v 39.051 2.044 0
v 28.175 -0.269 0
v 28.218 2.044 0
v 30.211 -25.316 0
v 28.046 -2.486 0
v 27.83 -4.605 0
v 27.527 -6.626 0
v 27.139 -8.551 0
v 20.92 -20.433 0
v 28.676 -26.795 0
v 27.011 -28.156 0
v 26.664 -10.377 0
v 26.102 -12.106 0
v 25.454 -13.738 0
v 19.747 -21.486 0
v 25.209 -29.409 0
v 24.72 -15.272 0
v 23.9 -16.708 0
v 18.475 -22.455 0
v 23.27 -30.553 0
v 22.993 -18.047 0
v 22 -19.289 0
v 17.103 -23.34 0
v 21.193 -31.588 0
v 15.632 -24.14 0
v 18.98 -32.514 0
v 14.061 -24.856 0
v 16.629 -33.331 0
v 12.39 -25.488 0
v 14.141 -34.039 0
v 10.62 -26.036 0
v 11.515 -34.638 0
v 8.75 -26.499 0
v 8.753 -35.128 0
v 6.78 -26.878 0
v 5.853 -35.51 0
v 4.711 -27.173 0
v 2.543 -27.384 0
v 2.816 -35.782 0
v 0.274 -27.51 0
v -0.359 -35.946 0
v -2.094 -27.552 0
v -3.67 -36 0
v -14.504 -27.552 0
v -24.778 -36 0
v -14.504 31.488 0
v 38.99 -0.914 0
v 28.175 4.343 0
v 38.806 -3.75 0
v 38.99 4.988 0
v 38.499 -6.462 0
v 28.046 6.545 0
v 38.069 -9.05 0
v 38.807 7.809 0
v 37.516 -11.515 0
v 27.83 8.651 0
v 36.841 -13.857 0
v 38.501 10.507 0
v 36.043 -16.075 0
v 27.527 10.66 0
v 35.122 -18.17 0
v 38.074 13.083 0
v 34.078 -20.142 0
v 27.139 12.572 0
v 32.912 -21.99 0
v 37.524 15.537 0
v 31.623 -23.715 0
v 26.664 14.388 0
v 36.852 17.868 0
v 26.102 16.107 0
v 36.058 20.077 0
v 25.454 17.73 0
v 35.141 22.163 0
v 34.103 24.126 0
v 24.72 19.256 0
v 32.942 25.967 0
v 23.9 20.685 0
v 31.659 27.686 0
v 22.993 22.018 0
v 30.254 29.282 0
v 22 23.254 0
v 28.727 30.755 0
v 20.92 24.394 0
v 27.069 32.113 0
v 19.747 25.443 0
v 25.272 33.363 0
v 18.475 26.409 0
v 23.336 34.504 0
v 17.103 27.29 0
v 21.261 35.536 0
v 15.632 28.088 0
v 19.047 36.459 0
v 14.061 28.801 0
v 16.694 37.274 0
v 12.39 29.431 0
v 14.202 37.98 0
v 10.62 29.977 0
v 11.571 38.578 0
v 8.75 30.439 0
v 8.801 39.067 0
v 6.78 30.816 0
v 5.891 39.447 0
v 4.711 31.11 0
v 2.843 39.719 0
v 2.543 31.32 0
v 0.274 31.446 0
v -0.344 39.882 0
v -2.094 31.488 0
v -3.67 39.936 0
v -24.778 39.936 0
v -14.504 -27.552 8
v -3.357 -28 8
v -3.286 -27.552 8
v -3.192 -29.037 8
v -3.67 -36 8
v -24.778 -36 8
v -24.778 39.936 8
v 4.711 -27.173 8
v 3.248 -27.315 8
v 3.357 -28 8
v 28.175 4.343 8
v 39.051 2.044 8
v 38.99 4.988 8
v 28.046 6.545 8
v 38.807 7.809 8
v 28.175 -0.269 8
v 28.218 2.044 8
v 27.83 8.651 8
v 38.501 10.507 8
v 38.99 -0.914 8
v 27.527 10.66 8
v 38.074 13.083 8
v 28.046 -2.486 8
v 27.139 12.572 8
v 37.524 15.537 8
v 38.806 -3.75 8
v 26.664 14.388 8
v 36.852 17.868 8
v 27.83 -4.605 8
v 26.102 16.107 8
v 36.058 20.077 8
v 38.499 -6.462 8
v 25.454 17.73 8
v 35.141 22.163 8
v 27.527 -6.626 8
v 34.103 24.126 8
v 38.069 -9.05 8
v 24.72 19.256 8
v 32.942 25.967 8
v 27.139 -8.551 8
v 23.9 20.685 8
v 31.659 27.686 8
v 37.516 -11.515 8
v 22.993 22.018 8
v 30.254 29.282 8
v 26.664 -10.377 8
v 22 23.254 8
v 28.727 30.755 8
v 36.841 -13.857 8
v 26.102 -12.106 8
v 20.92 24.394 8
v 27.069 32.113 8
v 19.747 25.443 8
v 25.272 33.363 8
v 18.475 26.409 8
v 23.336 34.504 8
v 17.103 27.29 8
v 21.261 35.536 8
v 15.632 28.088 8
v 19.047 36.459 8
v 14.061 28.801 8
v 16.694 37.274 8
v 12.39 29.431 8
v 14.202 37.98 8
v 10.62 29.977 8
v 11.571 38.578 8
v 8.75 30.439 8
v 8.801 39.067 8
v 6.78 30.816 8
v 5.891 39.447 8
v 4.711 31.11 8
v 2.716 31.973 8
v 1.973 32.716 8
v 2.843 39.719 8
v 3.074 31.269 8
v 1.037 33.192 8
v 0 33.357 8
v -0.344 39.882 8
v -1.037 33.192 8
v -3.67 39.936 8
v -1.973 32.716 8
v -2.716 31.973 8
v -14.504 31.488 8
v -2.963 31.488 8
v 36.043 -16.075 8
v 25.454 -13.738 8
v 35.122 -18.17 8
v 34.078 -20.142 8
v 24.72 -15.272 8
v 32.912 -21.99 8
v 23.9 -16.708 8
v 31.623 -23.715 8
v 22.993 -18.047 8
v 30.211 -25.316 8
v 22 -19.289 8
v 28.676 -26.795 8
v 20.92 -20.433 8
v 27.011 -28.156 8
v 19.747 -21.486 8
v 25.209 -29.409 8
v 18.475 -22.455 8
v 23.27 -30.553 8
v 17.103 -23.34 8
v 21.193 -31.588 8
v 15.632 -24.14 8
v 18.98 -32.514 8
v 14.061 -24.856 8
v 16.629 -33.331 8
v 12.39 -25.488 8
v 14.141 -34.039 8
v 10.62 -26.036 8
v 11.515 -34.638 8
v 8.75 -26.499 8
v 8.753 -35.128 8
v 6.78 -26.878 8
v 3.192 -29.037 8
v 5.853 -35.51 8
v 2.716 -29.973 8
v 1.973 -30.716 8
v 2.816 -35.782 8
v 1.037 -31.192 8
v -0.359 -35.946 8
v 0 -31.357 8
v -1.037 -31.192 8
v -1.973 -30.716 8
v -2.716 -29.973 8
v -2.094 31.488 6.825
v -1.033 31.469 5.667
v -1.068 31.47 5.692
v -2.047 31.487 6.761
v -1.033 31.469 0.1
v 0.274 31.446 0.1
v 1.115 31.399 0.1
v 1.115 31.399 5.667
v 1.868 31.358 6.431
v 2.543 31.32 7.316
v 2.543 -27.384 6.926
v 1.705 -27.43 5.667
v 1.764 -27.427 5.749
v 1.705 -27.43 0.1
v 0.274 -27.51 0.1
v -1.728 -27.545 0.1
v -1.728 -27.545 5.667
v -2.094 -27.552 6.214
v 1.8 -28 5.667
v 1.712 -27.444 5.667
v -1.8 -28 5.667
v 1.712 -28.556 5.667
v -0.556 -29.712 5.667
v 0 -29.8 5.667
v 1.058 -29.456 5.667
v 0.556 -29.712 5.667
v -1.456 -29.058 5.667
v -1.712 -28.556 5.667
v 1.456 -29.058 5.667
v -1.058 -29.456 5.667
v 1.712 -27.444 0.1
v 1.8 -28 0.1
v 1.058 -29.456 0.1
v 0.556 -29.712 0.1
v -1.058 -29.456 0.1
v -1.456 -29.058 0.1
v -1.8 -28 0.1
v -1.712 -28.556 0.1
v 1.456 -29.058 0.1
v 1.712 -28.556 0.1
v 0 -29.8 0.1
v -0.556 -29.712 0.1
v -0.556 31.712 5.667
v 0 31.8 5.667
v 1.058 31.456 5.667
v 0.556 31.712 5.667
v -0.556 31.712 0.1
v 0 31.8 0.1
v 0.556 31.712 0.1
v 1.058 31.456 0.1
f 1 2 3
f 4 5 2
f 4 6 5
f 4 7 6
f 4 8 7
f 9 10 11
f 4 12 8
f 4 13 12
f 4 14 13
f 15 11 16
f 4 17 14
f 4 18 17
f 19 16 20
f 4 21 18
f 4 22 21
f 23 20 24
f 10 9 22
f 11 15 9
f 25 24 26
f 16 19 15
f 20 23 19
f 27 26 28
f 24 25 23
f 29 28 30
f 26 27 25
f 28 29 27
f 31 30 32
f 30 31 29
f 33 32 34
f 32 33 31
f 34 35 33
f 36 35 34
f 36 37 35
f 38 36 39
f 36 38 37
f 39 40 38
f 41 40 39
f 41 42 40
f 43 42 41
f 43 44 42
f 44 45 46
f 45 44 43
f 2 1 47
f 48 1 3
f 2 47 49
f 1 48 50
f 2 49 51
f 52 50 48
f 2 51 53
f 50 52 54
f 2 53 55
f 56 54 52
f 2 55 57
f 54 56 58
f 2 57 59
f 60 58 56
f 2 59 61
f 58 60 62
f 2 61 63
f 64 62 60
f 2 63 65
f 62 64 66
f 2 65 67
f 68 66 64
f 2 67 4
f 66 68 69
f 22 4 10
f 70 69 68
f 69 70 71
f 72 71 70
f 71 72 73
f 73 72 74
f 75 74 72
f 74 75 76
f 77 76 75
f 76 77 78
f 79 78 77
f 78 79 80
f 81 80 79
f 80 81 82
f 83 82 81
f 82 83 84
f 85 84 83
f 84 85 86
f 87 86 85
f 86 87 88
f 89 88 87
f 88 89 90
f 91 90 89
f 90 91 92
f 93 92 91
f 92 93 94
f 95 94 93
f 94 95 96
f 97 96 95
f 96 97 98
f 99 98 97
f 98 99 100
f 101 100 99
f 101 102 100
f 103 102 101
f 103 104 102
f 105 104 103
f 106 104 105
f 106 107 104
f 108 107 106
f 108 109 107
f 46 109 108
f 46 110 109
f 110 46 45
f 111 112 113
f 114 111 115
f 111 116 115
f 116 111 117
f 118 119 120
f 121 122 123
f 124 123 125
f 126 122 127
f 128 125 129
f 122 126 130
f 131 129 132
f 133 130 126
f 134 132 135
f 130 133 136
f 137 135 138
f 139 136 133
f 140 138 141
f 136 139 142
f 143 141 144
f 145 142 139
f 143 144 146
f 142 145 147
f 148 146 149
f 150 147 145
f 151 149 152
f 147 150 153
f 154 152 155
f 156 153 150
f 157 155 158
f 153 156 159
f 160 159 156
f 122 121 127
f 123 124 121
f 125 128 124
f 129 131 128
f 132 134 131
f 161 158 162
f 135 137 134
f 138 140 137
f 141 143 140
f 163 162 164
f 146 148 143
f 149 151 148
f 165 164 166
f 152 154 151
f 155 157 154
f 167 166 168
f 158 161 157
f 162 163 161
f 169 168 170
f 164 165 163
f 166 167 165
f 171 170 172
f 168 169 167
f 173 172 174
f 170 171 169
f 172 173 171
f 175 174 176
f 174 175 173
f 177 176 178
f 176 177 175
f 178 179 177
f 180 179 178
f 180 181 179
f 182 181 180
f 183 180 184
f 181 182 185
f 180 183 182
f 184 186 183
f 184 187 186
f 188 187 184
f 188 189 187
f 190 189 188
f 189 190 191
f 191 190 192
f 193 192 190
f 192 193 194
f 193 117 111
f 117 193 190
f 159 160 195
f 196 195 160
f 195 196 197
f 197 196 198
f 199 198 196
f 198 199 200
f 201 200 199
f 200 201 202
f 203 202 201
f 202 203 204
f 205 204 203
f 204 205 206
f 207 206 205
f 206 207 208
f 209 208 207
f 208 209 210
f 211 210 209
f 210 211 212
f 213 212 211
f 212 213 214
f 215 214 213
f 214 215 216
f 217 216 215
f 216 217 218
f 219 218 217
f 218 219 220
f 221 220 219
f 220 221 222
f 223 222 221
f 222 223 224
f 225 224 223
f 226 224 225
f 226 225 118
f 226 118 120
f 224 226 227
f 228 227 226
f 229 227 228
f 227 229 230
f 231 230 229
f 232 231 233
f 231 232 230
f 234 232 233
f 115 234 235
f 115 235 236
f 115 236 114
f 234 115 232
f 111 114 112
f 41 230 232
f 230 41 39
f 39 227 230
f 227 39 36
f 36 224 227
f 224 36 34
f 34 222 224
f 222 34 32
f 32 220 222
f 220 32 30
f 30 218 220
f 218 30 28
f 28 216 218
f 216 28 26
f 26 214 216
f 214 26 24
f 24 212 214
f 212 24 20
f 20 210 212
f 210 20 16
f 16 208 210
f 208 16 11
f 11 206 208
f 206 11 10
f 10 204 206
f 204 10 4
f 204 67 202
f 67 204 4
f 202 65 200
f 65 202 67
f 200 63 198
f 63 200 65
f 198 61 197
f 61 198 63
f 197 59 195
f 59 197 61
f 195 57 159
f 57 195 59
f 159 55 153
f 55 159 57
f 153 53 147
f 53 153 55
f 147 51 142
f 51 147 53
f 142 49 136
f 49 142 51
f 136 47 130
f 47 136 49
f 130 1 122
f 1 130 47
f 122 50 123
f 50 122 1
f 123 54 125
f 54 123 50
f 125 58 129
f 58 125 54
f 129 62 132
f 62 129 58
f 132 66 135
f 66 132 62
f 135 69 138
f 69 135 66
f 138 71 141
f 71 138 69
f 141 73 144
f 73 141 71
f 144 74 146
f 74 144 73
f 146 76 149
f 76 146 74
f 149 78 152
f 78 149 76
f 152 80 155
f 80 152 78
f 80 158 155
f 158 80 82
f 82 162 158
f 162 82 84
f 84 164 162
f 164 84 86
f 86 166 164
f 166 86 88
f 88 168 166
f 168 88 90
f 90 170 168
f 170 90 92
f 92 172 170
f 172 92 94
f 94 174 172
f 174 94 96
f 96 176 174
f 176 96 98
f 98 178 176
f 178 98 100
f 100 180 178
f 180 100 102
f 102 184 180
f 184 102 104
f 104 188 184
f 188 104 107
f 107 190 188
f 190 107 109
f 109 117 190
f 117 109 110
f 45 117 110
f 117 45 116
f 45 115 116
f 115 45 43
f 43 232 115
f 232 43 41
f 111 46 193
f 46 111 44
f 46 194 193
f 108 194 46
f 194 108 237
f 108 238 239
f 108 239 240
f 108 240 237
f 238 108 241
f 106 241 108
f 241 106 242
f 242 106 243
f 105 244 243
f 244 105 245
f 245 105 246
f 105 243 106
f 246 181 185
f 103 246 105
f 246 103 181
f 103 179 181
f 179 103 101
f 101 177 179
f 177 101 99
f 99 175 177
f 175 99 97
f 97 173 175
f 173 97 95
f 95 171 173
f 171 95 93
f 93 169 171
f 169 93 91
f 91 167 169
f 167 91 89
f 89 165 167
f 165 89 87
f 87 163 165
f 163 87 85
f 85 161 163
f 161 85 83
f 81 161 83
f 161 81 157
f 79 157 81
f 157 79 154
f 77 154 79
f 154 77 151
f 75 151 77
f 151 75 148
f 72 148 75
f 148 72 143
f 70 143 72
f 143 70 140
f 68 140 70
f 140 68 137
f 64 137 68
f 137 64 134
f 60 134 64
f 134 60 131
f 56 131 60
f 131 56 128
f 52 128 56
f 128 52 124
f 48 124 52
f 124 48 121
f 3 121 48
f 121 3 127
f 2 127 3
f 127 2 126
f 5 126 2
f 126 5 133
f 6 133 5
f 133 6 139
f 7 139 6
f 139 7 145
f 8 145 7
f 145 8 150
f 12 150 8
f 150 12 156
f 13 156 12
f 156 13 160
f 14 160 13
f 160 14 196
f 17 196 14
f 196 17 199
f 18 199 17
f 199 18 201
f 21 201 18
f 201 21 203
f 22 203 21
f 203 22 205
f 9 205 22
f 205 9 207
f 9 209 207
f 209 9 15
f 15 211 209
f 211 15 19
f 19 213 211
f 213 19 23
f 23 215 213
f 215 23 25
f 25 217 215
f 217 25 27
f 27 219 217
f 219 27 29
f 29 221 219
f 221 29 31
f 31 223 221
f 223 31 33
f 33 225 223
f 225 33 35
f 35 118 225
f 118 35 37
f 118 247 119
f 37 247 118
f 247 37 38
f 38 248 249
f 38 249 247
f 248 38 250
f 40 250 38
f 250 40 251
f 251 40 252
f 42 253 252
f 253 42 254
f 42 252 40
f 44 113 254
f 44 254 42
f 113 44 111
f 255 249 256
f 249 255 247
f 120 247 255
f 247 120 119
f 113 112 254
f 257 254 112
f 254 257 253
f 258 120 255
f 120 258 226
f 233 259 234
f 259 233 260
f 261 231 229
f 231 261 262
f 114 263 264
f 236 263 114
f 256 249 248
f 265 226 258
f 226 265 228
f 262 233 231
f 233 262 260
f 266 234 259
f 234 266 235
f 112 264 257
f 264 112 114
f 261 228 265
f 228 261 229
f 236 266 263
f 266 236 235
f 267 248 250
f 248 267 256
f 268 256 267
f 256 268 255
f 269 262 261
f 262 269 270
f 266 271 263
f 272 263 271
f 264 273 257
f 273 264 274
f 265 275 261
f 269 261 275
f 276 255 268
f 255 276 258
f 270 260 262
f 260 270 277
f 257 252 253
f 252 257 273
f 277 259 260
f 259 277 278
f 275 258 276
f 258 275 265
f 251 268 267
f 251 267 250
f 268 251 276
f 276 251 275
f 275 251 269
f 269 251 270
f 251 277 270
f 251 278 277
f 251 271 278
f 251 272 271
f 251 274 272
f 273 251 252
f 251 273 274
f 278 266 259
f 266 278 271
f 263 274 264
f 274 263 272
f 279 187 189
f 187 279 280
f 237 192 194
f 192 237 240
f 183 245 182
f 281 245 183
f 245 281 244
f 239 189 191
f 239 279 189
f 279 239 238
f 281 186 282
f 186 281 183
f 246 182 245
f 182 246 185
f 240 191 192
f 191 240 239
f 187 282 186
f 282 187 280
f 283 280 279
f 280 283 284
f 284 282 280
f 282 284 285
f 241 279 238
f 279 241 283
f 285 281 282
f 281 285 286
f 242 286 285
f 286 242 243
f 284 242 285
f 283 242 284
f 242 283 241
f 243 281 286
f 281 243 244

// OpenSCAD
// Street Numbers for 3D printing
// Charles Tilford, 2019
// License: CC BY-NC-SA 4.0
//   https://creativecommons.org/licenses/by-nc-sa/4.0/

char="D";     // The number/letter to print

// Units are in mm, except for height of letter

// How many inches high should letter be?
inchesHigh=3;
// How thick/deep should letter be (mm)?
depth=8;

// Character coordinates just center the letter
charX=-35;    // Character X coord
charY=-36;    // Character Y coord
topScrew=30;  // Top screw Y coord
botScrew=-28; // Bottom screw Y coord
height=8;     // Thickness of character
// Screw dimensions. Default presumes
// #6 sheet metal screw
screwWid=3.6; // Width of screw shaft
screwTop=6.78;// Width of screw head
screwCon=5.08;// Height of head 'cone'

// Font to print in. Your system needs this
// installed, of course. If changed the hole
// positions almost certainly need to be
// changed, and maybe charX/charY.
fName="Open Sans Extrabold";
// https://fonts.google.com/specimen/Open+Sans
// Designer: Steve Matteson

// Thin floor below holes. My printer was
// struggling to have the hole 'border' stick
// to the stage. Just drill/screw thru it.
holeFloor=0.1; 

// ==========================================
// ===== All values below are auto-calculated
// ==========================================

// Scaled values
scaleFactor=inchesHigh / 3;
cX=charX * scaleFactor;
cY=charY * scaleFactor;
tS=topScrew * scaleFactor;
bS=botScrew * scaleFactor;
// Where do we start drawing screw head cone?
oS=depth - (screwCon-.05);

difference() {
  // We use difference() to punch out the screw holes
  // in the character
    
  // The character itself, 8mm thick
  translate([cX,cY,0])
    linear_extrude(height=depth, scale=1)
    text(char, size=(75*scaleFactor),
         $fn=100, font=fName);
    
  // Bottom screw hole
  translate([0,bS,oS]) color("red")
    cylinder(h=screwCon, d2=screwTop,
             d1=0, $fn=20);
   translate([0,bS,holeFloor])
    cylinder(h=20, d=screwWid, $fn=20);
    
  // Top screw hole
  translate([0,tS,oS]) color("red")
    cylinder(h=screwCon, d2=screwTop,
             d1=0, $fn=20);
  translate([0,tS,holeFloor])
    cylinder(h=20, d=screwWid, $fn=20);
}

// Colors are just to aid visualization of
// void spaces. $fn is "featuer number", ie how
// many polygons are devoted to object. The values
// above should be near your printing limit anyway.

// Developed in OpenSCAD
//    https://www.openscad.org/
